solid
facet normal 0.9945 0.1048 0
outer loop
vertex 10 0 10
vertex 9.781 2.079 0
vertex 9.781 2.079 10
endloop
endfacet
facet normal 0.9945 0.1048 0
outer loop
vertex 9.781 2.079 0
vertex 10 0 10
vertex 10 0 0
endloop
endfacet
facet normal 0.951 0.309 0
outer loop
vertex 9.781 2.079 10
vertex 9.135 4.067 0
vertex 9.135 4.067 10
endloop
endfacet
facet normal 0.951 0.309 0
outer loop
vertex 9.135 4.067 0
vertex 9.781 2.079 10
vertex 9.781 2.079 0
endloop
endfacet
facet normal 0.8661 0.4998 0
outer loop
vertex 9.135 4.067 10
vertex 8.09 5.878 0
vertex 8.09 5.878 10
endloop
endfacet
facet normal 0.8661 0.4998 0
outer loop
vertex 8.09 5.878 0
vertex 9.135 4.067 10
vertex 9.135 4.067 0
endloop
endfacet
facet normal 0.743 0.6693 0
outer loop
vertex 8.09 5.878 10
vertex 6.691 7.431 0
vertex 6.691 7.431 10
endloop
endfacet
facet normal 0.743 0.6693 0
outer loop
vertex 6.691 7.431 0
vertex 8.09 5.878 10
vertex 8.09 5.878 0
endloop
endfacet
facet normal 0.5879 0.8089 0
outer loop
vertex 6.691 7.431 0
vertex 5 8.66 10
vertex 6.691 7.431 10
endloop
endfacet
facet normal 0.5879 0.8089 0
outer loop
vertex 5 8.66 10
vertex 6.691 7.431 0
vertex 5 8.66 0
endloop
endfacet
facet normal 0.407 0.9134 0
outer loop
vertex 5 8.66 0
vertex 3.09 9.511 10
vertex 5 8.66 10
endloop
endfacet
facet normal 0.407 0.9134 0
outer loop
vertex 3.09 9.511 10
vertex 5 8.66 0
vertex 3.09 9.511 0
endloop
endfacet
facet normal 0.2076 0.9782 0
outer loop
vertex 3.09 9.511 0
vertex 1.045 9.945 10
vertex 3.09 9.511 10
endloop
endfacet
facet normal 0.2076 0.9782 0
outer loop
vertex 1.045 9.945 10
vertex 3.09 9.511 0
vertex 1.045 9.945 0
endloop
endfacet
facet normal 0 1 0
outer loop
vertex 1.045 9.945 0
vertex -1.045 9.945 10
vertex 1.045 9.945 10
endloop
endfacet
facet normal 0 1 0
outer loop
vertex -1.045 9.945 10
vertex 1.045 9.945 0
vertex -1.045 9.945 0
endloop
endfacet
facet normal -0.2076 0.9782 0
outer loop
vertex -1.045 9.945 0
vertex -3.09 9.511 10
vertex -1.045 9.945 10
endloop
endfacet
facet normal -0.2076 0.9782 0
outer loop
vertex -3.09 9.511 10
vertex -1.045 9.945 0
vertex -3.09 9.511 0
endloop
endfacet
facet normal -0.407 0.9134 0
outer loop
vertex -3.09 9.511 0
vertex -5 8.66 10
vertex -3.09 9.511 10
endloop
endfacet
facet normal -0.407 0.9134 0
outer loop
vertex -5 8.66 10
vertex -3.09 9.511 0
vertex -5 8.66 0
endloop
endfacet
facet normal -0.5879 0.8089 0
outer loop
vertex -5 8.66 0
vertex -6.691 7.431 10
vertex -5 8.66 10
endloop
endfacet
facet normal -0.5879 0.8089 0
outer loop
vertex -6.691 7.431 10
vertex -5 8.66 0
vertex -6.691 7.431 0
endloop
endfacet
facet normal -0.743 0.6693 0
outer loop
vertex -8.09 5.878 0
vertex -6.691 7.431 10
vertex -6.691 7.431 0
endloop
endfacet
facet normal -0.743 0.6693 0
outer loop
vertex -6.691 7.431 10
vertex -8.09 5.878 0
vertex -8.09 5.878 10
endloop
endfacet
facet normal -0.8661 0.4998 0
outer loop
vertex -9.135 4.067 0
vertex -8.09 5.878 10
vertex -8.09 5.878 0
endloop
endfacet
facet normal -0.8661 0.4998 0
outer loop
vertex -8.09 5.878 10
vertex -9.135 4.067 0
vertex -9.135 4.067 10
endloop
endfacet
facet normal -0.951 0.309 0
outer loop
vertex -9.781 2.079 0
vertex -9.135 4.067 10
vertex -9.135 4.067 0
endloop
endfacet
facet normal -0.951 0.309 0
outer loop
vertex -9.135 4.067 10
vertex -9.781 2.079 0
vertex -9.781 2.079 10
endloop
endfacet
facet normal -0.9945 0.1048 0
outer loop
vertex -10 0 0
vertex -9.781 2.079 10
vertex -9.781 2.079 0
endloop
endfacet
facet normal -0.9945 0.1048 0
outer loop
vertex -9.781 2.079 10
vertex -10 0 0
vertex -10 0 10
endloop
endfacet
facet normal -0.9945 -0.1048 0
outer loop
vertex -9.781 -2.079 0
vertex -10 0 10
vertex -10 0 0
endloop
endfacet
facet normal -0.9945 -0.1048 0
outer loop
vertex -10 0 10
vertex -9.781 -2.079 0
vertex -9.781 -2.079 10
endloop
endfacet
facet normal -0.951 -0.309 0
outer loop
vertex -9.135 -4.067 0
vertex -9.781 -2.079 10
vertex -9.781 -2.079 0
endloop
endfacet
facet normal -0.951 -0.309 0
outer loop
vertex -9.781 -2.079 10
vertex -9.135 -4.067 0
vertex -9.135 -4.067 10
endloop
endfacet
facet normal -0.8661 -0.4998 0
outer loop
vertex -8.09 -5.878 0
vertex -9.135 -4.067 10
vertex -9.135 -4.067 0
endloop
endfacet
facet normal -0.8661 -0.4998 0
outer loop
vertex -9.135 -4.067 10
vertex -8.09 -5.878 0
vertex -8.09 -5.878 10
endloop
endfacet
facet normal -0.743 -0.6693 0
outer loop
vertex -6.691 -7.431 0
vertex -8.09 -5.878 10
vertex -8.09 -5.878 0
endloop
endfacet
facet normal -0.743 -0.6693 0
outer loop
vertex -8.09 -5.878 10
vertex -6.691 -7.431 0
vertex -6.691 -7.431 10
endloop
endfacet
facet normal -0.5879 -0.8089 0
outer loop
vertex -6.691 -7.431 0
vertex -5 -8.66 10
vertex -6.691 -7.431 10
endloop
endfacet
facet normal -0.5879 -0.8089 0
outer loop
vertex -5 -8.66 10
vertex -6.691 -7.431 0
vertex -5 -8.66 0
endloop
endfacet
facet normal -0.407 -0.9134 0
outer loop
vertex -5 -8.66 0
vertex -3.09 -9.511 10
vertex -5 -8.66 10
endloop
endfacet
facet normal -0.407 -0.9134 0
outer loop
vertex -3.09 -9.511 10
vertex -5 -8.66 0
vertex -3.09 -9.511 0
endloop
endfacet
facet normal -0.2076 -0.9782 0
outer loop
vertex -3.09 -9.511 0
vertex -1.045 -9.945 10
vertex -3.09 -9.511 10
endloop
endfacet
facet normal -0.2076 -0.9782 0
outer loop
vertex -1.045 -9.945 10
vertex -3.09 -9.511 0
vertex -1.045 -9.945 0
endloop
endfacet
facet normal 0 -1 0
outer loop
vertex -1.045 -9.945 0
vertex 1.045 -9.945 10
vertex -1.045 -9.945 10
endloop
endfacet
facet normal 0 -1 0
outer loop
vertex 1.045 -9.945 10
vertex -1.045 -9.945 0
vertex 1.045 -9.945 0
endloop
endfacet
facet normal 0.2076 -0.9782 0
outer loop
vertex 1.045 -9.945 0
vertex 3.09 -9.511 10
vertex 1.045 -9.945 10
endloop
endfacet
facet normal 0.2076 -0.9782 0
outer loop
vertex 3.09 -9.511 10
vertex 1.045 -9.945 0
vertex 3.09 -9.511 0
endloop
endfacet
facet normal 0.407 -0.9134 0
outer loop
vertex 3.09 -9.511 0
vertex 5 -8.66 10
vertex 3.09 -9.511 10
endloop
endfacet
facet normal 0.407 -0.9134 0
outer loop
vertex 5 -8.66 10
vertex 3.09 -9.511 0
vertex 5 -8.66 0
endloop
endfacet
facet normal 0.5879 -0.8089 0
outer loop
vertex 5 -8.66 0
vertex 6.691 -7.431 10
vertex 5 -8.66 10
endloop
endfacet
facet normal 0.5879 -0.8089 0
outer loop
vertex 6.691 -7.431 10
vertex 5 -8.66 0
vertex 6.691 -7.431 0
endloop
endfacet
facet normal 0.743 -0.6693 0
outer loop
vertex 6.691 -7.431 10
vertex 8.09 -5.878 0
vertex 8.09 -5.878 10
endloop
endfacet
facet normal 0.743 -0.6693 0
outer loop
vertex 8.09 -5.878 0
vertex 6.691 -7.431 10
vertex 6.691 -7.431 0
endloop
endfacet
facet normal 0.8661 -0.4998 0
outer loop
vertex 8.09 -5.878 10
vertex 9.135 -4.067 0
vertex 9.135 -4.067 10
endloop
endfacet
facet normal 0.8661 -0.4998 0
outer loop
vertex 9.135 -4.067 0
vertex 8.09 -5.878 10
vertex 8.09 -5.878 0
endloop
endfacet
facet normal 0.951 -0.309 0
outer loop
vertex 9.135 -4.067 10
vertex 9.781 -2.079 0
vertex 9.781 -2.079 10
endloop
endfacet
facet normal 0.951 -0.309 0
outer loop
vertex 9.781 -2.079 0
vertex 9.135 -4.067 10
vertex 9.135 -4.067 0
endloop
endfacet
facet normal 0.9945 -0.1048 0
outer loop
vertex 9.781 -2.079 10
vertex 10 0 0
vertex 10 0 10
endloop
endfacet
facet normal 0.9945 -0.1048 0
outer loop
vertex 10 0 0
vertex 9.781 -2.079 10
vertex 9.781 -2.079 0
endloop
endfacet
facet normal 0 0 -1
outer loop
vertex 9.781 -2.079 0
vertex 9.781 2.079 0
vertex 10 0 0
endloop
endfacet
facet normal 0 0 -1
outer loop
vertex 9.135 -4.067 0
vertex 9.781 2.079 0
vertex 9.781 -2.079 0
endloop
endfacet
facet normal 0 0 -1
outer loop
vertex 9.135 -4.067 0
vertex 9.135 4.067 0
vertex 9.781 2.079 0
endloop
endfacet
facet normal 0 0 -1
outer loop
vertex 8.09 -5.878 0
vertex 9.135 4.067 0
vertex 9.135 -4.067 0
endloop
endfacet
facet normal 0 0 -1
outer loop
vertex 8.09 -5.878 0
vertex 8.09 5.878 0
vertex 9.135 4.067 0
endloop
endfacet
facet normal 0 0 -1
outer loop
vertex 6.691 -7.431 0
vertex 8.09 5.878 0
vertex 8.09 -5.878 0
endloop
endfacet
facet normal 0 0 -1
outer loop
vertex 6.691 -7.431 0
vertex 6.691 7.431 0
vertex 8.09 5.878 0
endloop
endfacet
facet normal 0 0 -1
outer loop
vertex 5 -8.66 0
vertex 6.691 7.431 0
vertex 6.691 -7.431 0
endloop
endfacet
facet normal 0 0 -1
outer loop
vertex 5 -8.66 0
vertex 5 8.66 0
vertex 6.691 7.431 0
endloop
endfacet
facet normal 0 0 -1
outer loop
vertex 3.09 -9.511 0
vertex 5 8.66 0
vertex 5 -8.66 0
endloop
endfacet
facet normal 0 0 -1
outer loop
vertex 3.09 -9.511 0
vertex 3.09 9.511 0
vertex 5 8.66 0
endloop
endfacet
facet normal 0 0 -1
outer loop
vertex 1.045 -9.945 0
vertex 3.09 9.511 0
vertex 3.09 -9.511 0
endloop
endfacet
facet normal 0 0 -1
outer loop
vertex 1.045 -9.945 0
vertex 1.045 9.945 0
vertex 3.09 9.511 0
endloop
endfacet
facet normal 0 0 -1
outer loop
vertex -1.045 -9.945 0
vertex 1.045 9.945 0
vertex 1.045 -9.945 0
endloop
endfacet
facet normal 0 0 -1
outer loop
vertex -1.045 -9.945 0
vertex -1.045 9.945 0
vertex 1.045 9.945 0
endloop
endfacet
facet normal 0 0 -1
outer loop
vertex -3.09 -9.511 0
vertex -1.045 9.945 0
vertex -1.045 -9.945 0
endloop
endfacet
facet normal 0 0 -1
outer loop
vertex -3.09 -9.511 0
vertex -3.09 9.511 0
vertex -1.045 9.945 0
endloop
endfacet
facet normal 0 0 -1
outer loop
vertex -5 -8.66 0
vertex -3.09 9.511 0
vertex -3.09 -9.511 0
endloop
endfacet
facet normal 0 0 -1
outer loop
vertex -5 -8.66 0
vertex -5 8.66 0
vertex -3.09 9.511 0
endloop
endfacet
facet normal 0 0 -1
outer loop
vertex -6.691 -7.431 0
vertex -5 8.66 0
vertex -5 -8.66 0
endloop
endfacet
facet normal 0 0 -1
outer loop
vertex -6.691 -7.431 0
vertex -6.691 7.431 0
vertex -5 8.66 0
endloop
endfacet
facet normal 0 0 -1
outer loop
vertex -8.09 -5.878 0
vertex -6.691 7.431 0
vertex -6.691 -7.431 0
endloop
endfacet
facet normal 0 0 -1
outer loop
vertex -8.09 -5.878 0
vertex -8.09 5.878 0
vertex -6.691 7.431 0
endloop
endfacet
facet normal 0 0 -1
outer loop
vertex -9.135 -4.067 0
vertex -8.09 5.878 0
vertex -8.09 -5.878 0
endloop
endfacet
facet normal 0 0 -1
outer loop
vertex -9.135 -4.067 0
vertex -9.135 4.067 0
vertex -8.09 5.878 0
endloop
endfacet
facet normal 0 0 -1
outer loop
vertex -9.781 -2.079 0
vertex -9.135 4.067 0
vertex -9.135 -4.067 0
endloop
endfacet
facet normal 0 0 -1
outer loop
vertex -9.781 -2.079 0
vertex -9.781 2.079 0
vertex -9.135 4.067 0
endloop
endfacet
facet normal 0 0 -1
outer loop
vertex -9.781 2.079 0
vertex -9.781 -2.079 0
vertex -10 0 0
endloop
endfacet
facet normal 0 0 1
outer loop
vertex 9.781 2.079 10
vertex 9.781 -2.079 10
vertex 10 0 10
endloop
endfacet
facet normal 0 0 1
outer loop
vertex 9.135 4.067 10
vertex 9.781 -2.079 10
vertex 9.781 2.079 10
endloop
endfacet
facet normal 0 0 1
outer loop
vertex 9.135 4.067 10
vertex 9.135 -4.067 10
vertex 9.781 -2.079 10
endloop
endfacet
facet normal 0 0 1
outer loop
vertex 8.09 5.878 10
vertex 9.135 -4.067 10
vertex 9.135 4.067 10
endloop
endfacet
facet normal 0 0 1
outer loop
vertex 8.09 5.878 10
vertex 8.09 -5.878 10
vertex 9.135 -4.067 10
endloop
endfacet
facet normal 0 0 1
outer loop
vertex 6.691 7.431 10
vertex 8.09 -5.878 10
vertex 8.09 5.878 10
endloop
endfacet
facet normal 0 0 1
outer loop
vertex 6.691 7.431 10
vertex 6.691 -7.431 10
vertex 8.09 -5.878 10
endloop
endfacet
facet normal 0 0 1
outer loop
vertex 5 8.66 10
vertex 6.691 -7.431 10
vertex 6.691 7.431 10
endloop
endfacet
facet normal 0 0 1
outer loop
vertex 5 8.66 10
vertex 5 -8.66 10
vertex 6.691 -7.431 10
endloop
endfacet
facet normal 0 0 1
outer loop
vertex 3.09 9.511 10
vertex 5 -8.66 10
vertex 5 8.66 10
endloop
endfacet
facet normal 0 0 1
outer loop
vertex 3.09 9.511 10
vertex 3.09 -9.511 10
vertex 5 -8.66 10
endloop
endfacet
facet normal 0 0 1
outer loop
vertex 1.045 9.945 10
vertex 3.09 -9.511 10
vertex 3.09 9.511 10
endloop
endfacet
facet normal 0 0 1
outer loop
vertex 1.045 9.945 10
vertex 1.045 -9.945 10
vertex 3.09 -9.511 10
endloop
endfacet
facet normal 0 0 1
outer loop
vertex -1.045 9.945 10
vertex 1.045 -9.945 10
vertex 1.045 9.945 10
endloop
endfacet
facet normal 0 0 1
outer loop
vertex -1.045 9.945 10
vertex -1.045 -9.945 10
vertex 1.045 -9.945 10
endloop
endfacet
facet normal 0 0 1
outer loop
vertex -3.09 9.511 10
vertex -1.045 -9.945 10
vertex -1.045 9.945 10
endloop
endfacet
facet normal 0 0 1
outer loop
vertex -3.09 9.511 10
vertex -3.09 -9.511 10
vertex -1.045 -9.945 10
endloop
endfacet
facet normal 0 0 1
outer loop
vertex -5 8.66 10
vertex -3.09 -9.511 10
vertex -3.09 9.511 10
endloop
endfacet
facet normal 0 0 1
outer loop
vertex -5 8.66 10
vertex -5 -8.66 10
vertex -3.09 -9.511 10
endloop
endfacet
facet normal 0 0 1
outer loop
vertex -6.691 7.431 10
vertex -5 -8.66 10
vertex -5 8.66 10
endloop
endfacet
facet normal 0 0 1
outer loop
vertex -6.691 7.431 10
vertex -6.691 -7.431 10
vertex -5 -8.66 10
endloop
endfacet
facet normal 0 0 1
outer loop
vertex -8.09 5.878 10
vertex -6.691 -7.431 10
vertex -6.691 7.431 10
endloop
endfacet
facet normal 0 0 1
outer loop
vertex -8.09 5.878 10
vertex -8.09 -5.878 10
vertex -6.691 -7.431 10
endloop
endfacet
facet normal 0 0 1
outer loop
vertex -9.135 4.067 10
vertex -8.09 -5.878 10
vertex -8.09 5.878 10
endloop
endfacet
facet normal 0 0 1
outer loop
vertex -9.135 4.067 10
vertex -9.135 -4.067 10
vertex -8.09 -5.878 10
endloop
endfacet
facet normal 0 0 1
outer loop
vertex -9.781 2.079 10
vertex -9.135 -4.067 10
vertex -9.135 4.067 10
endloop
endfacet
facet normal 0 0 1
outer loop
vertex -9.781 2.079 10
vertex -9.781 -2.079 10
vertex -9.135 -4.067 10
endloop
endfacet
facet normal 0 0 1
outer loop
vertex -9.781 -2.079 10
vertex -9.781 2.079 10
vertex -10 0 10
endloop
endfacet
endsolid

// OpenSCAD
// OpenSCAD
// converted from BlockSCAD XML by nicescad's blockscad converter
// according to 
// https://github.com/WolfgangFahl/nicescad/issues/23
// support reading and converting blockscad files #23
//

color("green");
cylinder(10,10,10,center=false);
